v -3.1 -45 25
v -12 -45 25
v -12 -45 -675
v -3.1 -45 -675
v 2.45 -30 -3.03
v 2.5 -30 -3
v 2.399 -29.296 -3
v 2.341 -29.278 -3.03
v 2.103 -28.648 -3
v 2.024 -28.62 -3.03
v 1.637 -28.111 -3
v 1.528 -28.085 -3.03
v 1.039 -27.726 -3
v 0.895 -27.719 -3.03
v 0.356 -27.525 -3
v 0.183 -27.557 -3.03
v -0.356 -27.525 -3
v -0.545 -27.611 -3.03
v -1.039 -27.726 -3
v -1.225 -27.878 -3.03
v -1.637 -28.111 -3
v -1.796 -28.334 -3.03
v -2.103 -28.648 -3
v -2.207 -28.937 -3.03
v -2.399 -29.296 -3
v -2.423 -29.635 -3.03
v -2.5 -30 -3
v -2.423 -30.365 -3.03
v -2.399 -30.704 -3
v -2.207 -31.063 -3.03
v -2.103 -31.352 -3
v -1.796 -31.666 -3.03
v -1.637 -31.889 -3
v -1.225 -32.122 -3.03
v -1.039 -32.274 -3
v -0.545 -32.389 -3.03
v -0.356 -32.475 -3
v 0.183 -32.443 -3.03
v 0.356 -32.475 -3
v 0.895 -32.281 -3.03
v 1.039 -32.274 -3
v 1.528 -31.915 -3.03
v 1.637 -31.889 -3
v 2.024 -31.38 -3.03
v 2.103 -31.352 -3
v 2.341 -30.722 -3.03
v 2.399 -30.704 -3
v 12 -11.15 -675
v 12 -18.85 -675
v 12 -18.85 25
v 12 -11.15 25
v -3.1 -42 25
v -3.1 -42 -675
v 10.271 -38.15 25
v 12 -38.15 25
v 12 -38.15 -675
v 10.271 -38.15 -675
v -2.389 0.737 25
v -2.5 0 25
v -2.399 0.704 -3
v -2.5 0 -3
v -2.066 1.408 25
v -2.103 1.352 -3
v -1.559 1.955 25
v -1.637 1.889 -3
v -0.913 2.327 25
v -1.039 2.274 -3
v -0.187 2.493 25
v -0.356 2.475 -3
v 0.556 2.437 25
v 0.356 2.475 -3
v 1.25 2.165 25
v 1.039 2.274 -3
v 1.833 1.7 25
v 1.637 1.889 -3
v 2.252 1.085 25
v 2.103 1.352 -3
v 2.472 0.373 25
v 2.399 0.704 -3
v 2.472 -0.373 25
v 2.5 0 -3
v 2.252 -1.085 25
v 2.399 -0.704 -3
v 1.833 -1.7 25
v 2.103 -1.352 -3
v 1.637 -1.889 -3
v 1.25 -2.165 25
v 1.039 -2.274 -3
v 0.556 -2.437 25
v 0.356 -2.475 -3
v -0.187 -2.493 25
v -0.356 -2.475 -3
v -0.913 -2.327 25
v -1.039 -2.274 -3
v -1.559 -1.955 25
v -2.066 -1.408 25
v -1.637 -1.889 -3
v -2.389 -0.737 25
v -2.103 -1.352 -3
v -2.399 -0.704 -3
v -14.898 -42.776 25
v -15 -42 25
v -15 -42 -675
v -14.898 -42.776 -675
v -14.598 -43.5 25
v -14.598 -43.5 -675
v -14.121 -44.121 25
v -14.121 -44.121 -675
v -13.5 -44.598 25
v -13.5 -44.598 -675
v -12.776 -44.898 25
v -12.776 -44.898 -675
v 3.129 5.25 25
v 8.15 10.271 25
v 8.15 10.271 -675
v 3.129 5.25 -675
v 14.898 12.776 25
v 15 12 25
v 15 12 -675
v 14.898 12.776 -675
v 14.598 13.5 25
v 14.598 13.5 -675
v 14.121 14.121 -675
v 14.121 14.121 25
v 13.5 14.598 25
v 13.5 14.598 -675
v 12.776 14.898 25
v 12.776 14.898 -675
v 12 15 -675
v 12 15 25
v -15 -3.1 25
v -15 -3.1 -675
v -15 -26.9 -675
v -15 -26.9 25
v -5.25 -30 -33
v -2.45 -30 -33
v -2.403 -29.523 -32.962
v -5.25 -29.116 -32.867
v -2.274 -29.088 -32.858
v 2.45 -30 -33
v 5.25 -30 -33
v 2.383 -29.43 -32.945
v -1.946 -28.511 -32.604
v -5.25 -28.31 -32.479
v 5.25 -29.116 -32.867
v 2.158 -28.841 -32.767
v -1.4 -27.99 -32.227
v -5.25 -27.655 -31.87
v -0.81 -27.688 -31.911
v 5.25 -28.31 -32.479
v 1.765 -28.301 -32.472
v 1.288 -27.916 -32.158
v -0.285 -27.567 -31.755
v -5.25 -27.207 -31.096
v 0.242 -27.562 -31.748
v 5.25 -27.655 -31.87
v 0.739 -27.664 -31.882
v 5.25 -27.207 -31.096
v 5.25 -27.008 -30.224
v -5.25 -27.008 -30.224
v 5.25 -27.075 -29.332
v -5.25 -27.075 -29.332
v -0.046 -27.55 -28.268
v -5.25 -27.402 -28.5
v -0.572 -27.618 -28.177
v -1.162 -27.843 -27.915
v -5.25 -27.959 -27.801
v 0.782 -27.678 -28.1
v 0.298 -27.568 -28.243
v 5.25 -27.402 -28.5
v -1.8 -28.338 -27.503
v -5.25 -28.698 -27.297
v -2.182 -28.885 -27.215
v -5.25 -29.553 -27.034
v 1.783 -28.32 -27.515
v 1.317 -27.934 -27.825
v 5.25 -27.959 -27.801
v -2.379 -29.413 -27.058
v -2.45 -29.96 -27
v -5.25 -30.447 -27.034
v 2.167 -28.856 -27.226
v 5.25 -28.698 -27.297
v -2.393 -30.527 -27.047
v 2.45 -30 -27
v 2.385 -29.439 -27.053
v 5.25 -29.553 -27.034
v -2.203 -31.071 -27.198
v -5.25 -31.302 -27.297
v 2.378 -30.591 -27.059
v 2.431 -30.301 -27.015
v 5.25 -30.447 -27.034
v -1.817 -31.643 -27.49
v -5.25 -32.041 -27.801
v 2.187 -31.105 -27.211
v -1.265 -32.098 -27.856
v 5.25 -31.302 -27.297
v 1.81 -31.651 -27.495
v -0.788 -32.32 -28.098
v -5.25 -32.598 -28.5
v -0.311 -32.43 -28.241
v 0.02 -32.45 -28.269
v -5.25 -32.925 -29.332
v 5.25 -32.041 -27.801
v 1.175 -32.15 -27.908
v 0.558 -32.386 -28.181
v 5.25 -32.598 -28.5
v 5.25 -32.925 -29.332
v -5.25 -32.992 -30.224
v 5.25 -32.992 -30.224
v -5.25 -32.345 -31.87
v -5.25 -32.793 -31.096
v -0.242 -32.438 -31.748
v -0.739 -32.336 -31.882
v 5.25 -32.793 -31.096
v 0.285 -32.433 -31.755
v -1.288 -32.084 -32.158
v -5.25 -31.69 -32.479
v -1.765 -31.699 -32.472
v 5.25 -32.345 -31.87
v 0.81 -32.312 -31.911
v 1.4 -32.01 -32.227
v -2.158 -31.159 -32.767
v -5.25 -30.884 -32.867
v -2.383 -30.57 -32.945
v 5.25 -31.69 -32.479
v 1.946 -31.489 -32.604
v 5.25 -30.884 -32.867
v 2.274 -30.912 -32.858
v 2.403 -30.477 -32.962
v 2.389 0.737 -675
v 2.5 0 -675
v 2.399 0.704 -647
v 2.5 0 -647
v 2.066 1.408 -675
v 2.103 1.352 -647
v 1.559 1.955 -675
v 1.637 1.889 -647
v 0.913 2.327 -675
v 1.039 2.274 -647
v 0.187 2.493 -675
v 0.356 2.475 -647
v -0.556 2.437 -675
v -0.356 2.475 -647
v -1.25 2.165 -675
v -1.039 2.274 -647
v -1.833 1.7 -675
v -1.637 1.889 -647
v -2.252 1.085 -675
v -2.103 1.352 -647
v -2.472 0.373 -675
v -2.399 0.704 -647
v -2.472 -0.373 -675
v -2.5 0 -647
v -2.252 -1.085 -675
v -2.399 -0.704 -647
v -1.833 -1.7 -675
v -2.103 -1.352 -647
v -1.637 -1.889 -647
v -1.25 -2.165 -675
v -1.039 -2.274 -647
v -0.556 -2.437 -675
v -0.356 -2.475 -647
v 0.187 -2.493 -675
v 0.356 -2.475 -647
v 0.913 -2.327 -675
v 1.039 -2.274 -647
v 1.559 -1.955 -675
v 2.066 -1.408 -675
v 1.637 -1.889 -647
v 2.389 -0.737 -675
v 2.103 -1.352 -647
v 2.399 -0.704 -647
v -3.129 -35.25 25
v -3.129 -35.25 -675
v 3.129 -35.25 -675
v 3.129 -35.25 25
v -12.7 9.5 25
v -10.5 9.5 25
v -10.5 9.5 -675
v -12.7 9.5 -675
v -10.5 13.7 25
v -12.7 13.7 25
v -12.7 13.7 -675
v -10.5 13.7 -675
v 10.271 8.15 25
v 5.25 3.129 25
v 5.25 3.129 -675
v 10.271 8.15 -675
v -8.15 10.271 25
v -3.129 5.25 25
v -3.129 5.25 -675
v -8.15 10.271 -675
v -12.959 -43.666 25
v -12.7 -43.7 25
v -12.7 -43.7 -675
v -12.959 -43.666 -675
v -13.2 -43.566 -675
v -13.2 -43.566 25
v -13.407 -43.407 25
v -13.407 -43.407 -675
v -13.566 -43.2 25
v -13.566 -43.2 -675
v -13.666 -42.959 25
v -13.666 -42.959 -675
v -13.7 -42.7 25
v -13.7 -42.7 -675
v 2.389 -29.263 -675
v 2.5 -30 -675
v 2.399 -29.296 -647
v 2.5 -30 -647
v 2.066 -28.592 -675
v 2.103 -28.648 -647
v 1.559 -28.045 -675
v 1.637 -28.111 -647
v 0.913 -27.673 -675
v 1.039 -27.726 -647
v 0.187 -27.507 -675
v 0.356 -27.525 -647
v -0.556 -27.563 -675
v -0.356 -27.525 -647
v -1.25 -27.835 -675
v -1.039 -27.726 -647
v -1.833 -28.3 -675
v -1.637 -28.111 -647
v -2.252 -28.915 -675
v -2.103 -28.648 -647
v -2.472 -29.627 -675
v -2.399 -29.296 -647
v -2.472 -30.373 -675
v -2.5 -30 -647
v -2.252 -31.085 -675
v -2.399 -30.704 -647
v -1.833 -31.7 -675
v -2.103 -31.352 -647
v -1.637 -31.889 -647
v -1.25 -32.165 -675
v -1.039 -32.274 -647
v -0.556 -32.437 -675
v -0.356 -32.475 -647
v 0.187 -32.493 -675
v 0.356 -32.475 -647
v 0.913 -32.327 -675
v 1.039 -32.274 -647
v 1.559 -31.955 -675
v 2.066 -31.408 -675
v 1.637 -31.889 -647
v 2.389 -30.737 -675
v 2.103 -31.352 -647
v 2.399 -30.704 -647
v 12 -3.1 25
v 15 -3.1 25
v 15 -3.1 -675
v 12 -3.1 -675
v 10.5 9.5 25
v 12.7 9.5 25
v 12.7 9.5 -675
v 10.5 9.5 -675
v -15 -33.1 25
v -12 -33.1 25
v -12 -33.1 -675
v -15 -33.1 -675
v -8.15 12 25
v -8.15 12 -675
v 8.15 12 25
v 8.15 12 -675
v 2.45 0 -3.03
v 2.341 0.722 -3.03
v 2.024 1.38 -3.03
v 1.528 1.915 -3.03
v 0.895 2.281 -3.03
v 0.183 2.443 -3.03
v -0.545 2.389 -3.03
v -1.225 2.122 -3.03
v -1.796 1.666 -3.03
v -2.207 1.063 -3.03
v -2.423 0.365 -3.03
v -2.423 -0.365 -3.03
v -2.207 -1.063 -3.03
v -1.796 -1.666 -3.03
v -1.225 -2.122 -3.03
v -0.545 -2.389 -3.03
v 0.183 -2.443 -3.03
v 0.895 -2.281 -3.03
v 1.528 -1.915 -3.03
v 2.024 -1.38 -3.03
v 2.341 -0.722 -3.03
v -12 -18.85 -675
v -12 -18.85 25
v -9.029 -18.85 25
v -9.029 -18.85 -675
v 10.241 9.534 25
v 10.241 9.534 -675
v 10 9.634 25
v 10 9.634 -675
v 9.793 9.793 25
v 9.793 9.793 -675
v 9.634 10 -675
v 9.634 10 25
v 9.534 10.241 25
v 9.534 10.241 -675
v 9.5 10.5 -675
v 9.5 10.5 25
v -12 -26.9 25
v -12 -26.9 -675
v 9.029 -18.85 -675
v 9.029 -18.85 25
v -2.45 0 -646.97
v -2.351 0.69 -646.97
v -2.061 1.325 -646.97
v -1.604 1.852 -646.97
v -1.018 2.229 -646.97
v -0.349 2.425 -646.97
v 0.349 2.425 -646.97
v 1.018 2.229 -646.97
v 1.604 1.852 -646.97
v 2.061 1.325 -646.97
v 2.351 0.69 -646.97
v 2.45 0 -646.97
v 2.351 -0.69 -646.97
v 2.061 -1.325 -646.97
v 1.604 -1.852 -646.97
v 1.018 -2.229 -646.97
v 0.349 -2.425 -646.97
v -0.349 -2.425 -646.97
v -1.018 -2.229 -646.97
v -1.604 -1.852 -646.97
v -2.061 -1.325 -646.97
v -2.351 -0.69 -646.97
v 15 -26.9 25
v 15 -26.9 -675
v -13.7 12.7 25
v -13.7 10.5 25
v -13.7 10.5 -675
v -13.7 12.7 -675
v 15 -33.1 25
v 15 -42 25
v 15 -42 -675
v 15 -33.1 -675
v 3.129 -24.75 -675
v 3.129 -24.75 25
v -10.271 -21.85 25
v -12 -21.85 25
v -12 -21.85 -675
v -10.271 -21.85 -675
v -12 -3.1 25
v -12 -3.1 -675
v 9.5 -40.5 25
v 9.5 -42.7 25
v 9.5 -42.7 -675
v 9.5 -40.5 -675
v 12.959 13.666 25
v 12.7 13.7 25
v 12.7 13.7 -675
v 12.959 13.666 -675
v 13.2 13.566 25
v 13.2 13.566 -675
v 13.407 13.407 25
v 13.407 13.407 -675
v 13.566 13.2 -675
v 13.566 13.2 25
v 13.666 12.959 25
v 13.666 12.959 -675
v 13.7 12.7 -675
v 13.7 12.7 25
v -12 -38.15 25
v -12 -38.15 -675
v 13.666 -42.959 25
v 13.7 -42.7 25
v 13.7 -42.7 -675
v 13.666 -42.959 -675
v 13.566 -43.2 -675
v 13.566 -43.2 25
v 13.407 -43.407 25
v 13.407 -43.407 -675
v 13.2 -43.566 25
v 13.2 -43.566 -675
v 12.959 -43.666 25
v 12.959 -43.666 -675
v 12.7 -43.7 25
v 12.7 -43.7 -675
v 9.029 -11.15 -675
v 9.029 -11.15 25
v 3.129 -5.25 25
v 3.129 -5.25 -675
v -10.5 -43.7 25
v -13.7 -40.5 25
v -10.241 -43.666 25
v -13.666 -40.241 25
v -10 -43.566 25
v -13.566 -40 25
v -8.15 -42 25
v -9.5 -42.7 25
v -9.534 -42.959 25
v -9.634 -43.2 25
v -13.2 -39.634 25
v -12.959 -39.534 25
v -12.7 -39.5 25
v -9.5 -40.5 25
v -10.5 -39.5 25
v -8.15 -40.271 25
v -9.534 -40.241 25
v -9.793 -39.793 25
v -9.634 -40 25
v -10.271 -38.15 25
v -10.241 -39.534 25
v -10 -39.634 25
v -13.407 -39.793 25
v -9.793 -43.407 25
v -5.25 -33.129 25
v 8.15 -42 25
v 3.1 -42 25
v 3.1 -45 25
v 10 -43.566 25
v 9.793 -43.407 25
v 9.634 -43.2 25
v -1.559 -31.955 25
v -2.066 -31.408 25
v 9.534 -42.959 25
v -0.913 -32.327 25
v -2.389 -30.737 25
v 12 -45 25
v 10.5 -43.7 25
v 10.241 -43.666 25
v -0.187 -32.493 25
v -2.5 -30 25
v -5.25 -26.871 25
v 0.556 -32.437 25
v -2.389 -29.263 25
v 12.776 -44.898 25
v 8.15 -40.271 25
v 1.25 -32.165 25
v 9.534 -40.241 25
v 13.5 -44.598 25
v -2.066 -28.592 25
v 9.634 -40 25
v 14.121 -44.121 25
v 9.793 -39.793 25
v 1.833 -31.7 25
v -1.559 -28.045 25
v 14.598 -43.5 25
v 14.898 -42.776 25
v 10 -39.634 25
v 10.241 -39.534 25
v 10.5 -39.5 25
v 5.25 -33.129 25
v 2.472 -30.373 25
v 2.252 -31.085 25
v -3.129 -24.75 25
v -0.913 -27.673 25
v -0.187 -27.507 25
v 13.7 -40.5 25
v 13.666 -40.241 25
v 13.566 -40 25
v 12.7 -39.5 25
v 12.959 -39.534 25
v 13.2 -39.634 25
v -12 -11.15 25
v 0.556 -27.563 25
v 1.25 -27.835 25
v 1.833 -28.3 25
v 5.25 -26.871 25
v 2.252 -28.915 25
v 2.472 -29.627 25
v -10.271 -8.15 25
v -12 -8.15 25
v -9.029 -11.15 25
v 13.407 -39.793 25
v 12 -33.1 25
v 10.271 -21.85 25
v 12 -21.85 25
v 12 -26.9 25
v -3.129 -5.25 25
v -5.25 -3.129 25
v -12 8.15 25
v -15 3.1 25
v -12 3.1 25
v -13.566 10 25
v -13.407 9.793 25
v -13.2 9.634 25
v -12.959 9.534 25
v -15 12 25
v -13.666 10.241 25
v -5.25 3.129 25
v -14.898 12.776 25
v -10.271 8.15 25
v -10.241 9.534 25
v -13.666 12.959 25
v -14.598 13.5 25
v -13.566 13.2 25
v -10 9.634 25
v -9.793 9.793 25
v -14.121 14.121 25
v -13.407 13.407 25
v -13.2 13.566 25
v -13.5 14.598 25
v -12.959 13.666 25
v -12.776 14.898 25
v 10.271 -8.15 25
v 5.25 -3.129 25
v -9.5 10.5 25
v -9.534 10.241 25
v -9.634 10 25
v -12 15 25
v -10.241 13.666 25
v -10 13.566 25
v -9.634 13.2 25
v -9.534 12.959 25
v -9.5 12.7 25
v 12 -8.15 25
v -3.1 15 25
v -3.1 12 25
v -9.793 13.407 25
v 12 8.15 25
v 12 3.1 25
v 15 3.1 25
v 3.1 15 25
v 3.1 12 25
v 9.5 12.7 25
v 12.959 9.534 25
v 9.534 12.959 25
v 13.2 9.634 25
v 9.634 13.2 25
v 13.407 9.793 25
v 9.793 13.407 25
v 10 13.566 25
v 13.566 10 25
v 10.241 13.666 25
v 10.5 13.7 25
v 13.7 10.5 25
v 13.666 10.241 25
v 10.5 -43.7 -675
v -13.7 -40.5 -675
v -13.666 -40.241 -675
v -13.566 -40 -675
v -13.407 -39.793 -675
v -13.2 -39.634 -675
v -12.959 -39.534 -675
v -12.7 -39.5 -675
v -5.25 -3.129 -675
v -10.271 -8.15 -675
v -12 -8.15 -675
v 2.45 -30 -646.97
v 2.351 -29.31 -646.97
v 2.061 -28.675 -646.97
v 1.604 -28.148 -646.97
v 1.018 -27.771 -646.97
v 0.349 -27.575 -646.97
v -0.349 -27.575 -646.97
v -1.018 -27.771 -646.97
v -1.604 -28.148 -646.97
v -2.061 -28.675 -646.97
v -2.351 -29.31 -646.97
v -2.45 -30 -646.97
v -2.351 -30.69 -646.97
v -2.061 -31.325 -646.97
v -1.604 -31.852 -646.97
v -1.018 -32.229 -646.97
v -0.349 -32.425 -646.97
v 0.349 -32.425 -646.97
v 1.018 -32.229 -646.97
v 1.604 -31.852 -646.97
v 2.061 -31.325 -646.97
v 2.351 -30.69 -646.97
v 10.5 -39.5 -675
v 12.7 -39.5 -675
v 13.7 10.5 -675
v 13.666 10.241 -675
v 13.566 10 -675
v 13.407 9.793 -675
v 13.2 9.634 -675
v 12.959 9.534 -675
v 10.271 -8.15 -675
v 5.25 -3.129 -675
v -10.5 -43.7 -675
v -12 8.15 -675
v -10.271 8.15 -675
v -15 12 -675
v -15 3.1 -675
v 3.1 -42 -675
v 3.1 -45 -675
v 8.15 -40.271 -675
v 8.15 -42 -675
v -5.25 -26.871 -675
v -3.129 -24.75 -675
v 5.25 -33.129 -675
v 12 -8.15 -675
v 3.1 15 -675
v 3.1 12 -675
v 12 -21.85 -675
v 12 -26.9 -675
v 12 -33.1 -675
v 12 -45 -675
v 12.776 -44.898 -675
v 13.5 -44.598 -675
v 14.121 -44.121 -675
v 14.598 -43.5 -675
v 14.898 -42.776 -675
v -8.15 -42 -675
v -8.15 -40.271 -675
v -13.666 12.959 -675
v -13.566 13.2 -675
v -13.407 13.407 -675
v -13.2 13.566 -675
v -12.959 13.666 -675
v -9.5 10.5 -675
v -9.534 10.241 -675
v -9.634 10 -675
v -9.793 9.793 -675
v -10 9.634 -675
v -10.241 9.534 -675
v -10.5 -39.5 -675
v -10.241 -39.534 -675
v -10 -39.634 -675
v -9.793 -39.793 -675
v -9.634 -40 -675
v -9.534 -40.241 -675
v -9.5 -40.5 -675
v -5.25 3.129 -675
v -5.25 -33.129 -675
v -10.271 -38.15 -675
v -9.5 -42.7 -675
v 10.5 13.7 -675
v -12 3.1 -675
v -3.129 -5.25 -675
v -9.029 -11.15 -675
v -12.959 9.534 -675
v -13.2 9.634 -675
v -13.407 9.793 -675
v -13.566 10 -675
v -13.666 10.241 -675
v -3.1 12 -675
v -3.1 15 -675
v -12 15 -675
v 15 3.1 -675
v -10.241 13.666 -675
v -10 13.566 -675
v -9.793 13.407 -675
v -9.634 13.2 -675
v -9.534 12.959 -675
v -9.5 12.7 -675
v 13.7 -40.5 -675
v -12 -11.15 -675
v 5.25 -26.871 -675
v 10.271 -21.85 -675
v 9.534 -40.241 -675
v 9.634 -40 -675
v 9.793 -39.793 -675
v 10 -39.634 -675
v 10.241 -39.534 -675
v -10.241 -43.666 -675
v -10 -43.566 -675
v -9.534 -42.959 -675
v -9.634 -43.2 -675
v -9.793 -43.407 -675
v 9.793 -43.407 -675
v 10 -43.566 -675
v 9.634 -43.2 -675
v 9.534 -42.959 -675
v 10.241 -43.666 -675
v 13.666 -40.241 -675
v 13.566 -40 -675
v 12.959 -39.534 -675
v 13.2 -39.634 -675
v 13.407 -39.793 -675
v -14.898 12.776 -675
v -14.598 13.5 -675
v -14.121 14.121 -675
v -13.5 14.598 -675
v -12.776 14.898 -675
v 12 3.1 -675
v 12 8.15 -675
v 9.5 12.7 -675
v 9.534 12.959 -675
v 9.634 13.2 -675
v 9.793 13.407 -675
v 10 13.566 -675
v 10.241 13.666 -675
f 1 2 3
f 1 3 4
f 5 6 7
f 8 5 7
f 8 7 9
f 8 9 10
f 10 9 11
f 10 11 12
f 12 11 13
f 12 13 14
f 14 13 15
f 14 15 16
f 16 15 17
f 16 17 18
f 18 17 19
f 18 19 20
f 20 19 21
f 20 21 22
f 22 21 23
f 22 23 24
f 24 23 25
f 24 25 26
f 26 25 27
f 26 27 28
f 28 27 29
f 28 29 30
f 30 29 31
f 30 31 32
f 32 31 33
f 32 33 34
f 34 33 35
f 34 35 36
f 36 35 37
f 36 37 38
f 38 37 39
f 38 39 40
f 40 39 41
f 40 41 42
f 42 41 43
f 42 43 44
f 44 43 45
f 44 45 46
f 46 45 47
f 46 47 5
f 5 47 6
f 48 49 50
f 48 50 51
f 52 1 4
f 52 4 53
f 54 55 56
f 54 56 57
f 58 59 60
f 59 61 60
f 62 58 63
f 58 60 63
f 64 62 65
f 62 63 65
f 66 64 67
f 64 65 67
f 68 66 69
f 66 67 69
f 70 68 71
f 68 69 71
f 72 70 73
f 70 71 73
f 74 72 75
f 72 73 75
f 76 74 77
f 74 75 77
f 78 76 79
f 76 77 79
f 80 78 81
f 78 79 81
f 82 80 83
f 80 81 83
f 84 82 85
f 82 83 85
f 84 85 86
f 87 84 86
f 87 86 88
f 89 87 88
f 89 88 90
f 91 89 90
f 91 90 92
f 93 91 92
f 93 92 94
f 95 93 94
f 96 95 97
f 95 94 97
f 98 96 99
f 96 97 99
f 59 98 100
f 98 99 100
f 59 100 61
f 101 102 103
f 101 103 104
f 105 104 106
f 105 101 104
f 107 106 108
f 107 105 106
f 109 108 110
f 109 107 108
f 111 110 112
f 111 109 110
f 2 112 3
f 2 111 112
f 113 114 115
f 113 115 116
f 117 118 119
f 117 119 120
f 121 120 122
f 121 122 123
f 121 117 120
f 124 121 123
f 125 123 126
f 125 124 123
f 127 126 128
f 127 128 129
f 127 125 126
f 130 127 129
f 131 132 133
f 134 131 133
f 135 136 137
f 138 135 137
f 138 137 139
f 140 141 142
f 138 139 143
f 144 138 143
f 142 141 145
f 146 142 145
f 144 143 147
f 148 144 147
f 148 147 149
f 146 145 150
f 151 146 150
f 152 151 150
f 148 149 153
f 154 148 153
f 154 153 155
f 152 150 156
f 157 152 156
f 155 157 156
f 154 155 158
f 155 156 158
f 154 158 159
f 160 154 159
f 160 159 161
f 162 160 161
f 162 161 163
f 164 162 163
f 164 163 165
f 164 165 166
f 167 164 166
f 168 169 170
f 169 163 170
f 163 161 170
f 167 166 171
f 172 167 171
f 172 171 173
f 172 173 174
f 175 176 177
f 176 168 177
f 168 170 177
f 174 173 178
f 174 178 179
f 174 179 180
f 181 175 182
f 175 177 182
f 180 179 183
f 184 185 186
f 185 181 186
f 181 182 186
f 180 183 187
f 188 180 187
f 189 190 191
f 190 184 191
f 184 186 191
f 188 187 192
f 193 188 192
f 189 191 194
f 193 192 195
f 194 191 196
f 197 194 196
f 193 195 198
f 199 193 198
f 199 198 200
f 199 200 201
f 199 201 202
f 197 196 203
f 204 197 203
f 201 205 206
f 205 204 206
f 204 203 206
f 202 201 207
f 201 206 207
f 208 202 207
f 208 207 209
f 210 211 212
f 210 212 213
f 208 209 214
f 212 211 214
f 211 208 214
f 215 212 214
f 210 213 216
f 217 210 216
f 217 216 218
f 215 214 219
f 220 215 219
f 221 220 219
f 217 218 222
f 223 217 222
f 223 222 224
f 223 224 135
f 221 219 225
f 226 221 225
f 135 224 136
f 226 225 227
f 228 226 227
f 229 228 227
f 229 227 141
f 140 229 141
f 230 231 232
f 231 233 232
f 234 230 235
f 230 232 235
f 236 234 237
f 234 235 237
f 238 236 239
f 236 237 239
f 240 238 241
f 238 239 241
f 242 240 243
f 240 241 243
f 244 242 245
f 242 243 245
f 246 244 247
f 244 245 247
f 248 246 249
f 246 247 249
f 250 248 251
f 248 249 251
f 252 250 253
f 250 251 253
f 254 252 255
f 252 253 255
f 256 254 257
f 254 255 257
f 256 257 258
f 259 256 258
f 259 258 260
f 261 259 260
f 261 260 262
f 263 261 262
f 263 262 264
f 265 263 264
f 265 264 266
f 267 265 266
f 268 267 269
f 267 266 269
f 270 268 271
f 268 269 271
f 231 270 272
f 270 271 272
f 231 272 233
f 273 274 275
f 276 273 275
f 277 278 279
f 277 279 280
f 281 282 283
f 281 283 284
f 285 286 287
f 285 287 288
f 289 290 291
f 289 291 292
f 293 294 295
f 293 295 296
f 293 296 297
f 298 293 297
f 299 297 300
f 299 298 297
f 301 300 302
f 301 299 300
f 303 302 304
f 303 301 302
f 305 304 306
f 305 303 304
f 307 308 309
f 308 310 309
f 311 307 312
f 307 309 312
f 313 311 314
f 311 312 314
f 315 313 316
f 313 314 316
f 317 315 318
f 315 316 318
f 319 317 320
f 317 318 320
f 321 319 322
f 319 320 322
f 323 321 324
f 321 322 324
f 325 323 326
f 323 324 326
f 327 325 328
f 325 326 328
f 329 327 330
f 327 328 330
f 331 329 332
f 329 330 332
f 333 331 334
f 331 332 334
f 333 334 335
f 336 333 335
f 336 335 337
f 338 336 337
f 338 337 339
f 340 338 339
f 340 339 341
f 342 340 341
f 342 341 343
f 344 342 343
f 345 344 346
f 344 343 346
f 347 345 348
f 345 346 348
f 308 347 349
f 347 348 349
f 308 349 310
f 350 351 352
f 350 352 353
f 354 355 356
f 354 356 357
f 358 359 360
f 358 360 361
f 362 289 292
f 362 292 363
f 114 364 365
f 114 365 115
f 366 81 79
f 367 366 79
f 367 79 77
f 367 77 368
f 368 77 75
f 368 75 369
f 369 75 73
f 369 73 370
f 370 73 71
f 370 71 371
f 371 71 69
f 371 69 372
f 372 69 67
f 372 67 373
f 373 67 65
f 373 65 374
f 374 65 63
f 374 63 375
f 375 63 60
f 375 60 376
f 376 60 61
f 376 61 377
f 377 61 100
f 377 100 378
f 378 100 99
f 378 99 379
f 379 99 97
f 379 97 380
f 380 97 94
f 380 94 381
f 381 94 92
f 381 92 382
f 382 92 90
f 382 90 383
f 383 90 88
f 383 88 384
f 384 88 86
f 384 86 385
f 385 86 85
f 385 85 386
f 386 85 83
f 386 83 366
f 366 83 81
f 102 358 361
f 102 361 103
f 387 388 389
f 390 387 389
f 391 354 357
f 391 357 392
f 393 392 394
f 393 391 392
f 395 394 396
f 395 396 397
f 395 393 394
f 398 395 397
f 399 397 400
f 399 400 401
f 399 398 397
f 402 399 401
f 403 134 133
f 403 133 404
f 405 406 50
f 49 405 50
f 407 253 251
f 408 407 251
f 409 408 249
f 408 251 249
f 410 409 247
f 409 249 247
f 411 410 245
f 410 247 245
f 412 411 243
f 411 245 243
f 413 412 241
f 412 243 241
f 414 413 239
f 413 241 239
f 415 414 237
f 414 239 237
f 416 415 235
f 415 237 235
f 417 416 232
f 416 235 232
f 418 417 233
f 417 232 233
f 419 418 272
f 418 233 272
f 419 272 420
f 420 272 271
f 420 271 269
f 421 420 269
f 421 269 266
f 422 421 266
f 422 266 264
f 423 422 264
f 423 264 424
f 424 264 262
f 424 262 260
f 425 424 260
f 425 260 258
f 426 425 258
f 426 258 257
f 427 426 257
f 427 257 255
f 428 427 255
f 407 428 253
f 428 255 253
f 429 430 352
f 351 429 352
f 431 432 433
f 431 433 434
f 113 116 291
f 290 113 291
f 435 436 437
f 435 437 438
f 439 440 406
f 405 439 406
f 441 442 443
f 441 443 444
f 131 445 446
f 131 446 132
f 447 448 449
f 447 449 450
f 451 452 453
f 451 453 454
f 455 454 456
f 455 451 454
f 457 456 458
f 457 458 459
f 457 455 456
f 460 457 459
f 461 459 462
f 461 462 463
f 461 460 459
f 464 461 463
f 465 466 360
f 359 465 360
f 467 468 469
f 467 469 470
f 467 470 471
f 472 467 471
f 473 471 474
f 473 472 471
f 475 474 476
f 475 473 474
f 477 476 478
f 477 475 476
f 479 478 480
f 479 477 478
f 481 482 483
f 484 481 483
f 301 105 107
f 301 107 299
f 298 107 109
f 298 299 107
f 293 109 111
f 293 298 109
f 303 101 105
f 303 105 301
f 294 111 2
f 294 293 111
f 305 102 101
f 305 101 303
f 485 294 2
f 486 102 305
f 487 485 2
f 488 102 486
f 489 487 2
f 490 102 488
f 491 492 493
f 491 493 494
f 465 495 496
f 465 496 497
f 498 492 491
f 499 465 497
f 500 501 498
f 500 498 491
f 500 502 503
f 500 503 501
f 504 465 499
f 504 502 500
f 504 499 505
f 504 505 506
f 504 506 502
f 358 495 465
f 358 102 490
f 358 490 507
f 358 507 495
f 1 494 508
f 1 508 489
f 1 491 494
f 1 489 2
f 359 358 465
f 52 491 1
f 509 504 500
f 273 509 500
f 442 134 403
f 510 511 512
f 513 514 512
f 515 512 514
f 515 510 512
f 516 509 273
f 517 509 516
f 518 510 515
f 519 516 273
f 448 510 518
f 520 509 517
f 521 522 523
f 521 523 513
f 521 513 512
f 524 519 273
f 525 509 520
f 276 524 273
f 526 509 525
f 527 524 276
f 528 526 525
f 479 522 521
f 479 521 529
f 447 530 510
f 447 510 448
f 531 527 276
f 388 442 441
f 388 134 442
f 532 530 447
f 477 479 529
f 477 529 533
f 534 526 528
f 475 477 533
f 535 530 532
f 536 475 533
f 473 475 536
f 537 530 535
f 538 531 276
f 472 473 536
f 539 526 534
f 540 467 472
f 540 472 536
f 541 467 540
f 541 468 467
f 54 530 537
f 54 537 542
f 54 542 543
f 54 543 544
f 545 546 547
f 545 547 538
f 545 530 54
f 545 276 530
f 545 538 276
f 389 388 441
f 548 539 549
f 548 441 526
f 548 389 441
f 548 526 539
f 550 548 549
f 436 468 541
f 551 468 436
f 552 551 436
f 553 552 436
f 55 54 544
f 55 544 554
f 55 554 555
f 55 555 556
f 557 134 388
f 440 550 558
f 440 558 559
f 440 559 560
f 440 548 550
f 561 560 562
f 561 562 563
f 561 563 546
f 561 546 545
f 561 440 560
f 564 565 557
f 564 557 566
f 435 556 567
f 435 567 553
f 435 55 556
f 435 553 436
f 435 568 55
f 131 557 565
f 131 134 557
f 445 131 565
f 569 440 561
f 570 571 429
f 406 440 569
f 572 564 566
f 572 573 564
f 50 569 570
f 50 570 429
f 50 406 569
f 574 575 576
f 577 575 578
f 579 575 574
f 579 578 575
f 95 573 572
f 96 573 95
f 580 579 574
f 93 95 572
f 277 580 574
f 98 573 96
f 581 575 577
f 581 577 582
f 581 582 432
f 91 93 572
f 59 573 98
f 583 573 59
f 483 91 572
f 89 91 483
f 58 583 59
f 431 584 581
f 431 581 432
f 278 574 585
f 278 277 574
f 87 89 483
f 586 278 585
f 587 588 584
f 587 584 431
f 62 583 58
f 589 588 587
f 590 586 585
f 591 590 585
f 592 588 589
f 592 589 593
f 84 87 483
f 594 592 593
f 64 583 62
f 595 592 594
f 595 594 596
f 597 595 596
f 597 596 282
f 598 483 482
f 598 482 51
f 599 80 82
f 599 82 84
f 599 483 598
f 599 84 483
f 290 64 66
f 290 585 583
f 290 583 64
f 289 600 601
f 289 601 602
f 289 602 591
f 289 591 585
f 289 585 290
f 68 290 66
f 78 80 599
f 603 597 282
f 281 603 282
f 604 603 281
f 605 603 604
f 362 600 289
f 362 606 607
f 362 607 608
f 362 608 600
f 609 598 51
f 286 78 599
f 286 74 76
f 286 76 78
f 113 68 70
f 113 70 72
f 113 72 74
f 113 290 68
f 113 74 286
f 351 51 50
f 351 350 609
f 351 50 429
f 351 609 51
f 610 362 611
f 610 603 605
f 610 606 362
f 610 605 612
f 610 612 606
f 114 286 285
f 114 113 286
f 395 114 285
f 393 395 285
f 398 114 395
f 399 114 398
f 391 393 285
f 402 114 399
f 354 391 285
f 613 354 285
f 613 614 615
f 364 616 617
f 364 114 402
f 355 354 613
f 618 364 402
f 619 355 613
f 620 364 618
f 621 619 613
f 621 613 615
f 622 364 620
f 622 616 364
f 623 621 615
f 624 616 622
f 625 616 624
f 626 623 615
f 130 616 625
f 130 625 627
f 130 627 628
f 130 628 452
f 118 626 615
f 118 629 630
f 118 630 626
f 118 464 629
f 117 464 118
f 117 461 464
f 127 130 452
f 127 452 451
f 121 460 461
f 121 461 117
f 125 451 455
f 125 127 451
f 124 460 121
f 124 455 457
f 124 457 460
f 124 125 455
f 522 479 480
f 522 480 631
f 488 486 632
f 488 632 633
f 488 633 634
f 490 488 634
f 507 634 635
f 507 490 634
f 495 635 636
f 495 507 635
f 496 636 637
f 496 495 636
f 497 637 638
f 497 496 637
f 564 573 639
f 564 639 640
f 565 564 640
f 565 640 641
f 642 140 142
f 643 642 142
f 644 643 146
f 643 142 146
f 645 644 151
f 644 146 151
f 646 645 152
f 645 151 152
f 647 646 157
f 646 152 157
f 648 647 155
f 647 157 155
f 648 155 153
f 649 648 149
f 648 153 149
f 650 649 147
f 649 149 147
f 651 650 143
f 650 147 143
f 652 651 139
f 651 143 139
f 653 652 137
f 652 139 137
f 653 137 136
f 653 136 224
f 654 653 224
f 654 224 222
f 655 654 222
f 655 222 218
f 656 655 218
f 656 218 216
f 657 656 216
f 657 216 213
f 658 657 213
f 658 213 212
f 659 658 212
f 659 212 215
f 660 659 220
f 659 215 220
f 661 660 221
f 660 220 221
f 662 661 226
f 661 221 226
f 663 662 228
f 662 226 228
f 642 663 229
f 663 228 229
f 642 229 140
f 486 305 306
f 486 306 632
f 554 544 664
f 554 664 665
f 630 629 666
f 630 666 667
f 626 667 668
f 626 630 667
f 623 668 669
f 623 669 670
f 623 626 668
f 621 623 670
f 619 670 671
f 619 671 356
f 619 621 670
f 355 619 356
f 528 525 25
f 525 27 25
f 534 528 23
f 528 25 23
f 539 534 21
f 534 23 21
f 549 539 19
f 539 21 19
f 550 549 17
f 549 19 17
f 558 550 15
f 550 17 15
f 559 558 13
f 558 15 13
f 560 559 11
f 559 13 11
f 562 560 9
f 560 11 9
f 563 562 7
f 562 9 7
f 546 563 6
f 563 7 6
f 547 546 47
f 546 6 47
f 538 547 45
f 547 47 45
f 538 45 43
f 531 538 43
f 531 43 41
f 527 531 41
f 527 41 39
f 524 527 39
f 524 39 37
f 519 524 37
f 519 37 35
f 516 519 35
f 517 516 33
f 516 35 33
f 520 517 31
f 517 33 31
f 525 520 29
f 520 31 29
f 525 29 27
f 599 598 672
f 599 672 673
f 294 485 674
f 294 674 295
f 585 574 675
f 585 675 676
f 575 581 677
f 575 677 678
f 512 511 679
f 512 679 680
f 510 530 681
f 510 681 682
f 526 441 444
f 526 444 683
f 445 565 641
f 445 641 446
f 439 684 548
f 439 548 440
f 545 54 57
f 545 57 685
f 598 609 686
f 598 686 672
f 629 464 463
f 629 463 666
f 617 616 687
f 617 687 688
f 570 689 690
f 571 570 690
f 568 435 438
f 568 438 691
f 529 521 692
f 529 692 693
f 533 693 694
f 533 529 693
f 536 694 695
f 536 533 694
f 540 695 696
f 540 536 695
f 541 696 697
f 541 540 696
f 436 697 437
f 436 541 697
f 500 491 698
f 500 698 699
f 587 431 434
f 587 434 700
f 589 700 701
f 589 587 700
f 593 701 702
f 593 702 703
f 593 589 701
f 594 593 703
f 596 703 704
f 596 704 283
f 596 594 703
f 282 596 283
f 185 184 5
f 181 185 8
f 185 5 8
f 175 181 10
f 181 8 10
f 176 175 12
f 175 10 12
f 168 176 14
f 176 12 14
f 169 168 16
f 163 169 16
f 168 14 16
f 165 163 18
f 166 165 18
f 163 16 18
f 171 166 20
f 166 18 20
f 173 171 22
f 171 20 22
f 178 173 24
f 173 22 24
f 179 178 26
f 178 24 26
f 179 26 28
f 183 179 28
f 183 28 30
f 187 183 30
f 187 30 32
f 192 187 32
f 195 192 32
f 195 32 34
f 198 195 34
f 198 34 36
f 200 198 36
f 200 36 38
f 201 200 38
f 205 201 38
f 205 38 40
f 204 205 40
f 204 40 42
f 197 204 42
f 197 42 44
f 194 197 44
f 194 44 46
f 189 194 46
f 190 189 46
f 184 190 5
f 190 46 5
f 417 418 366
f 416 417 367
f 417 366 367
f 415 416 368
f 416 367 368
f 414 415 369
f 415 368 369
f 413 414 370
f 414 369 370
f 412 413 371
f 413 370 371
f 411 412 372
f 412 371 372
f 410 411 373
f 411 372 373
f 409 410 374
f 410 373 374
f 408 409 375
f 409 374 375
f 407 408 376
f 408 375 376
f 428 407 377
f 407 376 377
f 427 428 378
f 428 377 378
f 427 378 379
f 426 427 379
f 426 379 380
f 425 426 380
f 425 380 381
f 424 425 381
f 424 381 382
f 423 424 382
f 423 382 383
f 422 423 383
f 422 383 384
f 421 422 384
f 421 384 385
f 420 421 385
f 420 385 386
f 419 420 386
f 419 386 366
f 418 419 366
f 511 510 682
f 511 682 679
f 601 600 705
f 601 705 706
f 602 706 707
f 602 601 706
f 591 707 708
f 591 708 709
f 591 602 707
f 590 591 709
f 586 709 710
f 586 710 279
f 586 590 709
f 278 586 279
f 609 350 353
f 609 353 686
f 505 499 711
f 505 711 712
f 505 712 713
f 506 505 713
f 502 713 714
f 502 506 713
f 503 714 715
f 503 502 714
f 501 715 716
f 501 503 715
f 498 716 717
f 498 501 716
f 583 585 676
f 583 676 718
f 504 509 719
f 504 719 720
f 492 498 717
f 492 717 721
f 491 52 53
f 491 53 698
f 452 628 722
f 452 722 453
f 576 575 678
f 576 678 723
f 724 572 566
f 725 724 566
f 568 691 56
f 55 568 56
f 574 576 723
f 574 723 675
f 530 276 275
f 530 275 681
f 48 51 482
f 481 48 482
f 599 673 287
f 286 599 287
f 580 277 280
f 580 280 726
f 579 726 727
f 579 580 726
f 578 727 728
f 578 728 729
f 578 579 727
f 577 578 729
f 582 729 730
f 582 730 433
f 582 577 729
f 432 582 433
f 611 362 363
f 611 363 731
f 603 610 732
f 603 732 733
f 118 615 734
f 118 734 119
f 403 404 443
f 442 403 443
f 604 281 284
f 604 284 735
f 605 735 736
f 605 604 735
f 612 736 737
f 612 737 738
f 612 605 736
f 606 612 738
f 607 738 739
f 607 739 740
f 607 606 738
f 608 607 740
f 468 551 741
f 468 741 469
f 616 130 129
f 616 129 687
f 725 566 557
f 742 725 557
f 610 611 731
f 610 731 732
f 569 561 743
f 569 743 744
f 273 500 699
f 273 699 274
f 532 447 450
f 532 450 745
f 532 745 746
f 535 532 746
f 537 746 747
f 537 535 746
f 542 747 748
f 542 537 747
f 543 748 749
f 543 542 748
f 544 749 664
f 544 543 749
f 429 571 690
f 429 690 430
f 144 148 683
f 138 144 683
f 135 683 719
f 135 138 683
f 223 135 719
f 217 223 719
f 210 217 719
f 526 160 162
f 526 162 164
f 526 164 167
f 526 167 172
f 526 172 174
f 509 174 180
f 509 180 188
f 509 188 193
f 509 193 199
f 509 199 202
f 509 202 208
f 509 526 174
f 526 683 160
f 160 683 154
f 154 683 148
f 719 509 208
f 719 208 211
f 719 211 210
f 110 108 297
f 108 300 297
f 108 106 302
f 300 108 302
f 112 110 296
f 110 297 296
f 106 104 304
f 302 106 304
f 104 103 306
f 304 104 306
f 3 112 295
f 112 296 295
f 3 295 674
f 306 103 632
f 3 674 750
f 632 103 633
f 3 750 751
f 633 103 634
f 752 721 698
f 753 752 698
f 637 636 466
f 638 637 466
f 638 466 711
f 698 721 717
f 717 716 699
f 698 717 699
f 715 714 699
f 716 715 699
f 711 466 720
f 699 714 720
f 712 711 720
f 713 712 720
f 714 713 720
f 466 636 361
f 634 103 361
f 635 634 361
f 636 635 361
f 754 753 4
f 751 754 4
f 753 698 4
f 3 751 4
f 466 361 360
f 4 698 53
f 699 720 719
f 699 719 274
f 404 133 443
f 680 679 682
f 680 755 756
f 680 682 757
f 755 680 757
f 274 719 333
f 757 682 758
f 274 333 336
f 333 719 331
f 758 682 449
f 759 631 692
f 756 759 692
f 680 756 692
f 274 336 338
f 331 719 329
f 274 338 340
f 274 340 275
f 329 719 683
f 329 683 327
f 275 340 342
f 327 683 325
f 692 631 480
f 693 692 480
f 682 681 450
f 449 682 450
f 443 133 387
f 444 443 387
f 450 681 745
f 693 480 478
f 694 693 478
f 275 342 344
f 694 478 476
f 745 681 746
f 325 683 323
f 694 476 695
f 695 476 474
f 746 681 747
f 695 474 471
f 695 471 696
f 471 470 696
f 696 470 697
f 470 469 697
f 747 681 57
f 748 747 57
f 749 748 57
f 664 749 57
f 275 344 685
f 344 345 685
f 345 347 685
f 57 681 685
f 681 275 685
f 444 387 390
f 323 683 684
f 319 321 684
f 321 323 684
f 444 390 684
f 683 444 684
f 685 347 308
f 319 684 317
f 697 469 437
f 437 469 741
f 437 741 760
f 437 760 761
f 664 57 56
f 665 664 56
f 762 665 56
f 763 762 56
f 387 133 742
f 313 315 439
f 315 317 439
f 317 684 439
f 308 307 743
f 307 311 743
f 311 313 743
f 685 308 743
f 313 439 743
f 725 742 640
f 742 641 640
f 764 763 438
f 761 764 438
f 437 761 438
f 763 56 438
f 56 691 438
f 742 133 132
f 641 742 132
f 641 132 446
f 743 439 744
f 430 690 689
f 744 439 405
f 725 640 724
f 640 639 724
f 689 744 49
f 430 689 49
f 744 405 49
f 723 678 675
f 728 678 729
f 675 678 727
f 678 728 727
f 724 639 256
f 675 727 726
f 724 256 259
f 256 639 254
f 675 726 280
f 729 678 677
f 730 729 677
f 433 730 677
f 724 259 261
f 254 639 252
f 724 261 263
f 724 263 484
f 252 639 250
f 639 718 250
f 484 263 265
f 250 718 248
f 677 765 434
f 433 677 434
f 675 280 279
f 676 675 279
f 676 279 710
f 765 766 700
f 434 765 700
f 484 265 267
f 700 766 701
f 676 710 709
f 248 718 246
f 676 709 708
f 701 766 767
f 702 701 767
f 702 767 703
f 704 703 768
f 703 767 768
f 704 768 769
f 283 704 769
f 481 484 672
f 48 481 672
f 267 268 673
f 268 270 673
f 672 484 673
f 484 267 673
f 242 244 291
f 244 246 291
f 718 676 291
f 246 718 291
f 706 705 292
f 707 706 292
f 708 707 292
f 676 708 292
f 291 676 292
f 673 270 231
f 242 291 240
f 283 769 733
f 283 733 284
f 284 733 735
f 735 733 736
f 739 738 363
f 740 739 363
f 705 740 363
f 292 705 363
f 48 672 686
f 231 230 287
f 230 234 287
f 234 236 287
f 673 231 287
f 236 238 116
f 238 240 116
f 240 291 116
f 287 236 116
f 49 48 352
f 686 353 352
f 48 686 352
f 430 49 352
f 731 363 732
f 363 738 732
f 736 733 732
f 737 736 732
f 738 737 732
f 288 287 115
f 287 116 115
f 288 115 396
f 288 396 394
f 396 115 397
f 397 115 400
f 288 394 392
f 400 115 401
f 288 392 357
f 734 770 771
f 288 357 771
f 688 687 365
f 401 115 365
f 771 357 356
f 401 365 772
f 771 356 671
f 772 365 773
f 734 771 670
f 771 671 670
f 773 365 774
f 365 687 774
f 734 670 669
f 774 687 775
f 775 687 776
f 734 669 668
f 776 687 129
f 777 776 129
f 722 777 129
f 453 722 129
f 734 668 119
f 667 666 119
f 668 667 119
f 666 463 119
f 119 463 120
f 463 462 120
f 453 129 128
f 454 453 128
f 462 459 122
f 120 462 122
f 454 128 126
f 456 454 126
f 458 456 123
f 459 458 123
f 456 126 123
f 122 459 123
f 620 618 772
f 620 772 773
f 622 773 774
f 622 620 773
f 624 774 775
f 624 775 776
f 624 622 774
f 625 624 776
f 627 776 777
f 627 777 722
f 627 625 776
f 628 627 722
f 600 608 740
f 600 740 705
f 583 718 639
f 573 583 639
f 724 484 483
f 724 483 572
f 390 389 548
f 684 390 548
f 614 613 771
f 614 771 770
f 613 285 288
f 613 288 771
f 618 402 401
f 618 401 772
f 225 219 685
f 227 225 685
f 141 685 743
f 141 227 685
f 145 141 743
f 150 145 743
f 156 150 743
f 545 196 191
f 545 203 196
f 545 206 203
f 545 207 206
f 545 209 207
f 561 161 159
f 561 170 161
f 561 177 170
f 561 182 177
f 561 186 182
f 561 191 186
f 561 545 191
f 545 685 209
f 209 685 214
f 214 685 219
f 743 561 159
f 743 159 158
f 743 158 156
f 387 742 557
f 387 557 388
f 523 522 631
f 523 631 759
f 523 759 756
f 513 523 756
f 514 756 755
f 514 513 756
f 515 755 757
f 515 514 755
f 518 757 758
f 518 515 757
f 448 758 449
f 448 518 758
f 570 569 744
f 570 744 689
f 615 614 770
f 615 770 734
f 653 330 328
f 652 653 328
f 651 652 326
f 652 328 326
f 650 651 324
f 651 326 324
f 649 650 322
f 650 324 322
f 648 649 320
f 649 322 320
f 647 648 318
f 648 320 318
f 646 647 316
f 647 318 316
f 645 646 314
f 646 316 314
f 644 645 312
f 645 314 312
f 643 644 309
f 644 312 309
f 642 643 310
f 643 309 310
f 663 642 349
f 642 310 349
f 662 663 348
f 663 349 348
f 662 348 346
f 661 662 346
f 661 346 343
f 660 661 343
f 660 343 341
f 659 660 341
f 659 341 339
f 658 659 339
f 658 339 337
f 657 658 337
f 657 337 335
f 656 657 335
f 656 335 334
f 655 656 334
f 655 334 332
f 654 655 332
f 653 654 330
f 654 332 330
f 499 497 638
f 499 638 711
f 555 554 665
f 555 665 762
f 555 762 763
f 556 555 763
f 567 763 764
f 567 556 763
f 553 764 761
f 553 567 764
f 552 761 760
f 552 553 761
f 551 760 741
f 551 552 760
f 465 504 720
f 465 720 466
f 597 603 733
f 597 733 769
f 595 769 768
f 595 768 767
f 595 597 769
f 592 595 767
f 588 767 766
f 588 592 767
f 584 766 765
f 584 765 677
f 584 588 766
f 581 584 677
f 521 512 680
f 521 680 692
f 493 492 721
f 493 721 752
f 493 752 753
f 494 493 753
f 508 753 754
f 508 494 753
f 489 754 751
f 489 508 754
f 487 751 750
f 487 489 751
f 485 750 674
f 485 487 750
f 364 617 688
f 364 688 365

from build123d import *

# Parameters (mm, degrees)
SKETCH1_R                 = 2.45
BOSS_EXTRUDE1_DEPTH       = 700
SKETCH2_R                 = 3
CUT_EXTRUDE1_DEPTH        = 678.163200418
M6X1_0_TAPPED_HOLE1_D     = 5
M6X1_0_TAPPED_HOLE1_DEPTH = 28
M6X1_0_TAPPED_HOLE1_TIP   = 1.502151548
M6X1_0_TAPPED_HOLE2_D     = 5
M6X1_0_TAPPED_HOLE2_DEPTH = 28
M6X1_0_TAPPED_HOLE2_TIP   = 1.502151548


with BuildPart() as part:
    # Sketch1 → Boss-Extrude1 (new body)
    with BuildSketch(Plane.XY.offset(25)):
        with BuildLine():
            Line((10.271320344, -21.85), (12, -21.85))
            Line((12, -21.85), (12, -26.9))
            Line((12, -26.9), (15, -26.9))
            Line((15, -26.9), (15, -3.1))
            Line((15, -3.1), (12, -3.1))
            Line((12, -3.1), (12, -8.15))
            Line((12, -8.15), (10.271320344, -8.15))
            Line((10.271320344, -8.15), (5.25, -3.128679656))
            Line((5.25, -3.128679656), (5.25, 3.128679656))
            Line((5.25, 3.128679656), (10.271320344, 8.15))
            Line((10.271320344, 8.15), (12, 8.15))
            Line((12, 8.15), (12, 3.1))
            Line((12, 3.1), (15, 3.1))
            Line((15, 3.1), (15, 12))
            ThreePointArc((15, 12), (14.121320344, 14.121320344), (12, 15))
            Line((12, 15), (3.1, 15))
            Line((3.1, 15), (3.1, 12))
            Line((3.1, 12), (8.15, 12))
            Line((8.15, 12), (8.15, 10.271320344))
            Line((8.15, 10.271320344), (3.128679656, 5.25))
            Line((3.128679656, 5.25), (-3.128679656, 5.25))
            Line((-3.128679656, 5.25), (-8.15, 10.271320344))
            Line((-8.15, 10.271320344), (-8.15, 12))
            Line((-8.15, 12), (-3.1, 12))
            Line((-3.1, 12), (-3.1, 15))
            Line((-3.1, 15), (-12, 15))
            ThreePointArc((-12, 15), (-14.121320344, 14.121320344), (-15, 12))
            Line((-15, 12), (-15, 3.1))
            Line((-15, 3.1), (-12, 3.1))
            Line((-12, 3.1), (-12, 8.15))
            Line((-12, 8.15), (-10.271320344, 8.15))
            Line((-10.271320344, 8.15), (-5.25, 3.128679656))
            Line((-5.25, 3.128679656), (-5.25, -3.128679656))
            Line((-5.25, -3.128679656), (-10.271320344, -8.15))
            Line((-10.271320344, -8.15), (-12, -8.15))
            Line((-12, -8.15), (-12, -3.1))
            Line((-12, -3.1), (-15, -3.1))
            Line((-15, -3.1), (-15, -26.9))
            Line((-15, -26.9), (-12, -26.9))
            Line((-12, -26.9), (-12, -21.85))
            Line((-12, -21.85), (-10.271320344, -21.85))
            Line((-10.271320344, -21.85), (-5.25, -26.871320344))
            Line((-5.25, -26.871320344), (-5.25, -33.128679656))
            Line((-5.25, -33.128679656), (-10.271320344, -38.15))
            Line((-10.271320344, -38.15), (-12, -38.15))
            Line((-12, -38.15), (-12, -33.1))
            Line((-12, -33.1), (-15, -33.1))
            Line((-15, -33.1), (-15, -42))
            ThreePointArc((-15, -42), (-14.121320344, -44.121320344), (-12, -45))
            Line((-12, -45), (-3.1, -45))
            Line((-3.1, -45), (-3.1, -42))
            Line((-3.1, -42), (-8.15, -42))
            Line((-8.15, -42), (-8.15, -40.271320344))
            Line((-8.15, -40.271320344), (-3.128679656, -35.25))
            Line((-3.128679656, -35.25), (3.128679656, -35.25))
            Line((3.128679656, -35.25), (8.15, -40.271320344))
            Line((8.15, -40.271320344), (8.15, -42))
            Line((8.15, -42), (3.1, -42))
            Line((3.1, -42), (3.1, -45))
            Line((3.1, -45), (12, -45))
            ThreePointArc((12, -45), (14.121320344, -44.121320344), (15, -42))
            Line((15, -42), (15, -33.1))
            Line((15, -33.1), (12, -33.1))
            Line((12, -33.1), (12, -38.15))
            Line((12, -38.15), (10.271320344, -38.15))
            Line((10.271320344, -38.15), (5.25, -33.128679656))
            Line((5.25, -33.128679656), (5.25, -26.871320344))
            Line((5.25, -26.871320344), (10.271320344, -21.85))
        make_face()
        Circle(SKETCH1_R, mode=Mode.SUBTRACT)
        with Locations((0, -30)):
            Circle(SKETCH1_R, mode=Mode.SUBTRACT)
        with BuildLine():
            Line((-9.500000904, 12.700000174), (-9.500000904, 10.500000174))
            ThreePointArc((-9.500000904, 10.500000174), (-9.792894123, 9.792893393), (-10.500000904, 9.500000174))
            Line((-10.500000904, 9.500000174), (-12.700000904, 9.500000174))
            ThreePointArc((-12.700000904, 9.500000174), (-13.407107685, 9.792893393), (-13.700000904, 10.500000174))
            Line((-13.700000904, 10.500000174), (-13.700000904, 12.700000174))
            ThreePointArc((-13.700000904, 12.700000174), (-13.407107685, 13.407106955), (-12.700000904, 13.700000174))
            Line((-12.700000904, 13.700000174), (-10.500000904, 13.700000174))
            ThreePointArc((-10.500000904, 13.700000174), (-9.792894123, 13.407106955), (-9.500000904, 12.700000174))
        make_face(mode=Mode.SUBTRACT)
        with BuildLine():
            Line((12.700000904, 9.500000174), (10.500000904, 9.500000174))
            ThreePointArc((10.500000904, 9.500000174), (9.792894123, 9.792893393), (9.500000904, 10.500000174))
            Line((9.500000904, 10.500000174), (9.500000904, 12.700000174))
            ThreePointArc((9.500000904, 12.700000174), (9.792894123, 13.407106955), (10.500000904, 13.700000174))
            Line((10.500000904, 13.700000174), (12.700000904, 13.700000174))
            ThreePointArc((12.700000904, 13.700000174), (13.407107685, 13.407106955), (13.700000904, 12.700000174))
            Line((13.700000904, 12.700000174), (13.700000904, 10.500000174))
            ThreePointArc((13.700000904, 10.500000174), (13.407107685, 9.792893393), (12.700000904, 9.500000174))
        make_face(mode=Mode.SUBTRACT)
        with BuildLine():
            Line((-12.700000904, -39.500000174), (-10.500000904, -39.500000174))
            ThreePointArc((-10.500000904, -39.500000174), (-9.792894123, -39.792893393), (-9.500000904, -40.500000174))
            Line((-9.500000904, -40.500000174), (-9.500000904, -42.700000174))
            ThreePointArc((-9.500000904, -42.700000174), (-9.792894123, -43.407106955), (-10.500000904, -43.700000174))
            Line((-10.500000904, -43.700000174), (-12.700000904, -43.700000174))
            ThreePointArc((-12.700000904, -43.700000174), (-13.407107685, -43.407106955), (-13.700000904, -42.700000174))
            Line((-13.700000904, -42.700000174), (-13.700000904, -40.500000174))
            ThreePointArc((-13.700000904, -40.500000174), (-13.407107685, -39.792893393), (-12.700000904, -39.500000174))
        make_face(mode=Mode.SUBTRACT)
        with BuildLine():
            Line((9.500000904, -42.700000174), (9.500000904, -40.500000174))
            ThreePointArc((9.500000904, -40.500000174), (9.792894123, -39.792893393), (10.500000904, -39.500000174))
            Line((10.500000904, -39.500000174), (12.700000904, -39.500000174))
            ThreePointArc((12.700000904, -39.500000174), (13.407107685, -39.792893393), (13.700000904, -40.500000174))
            Line((13.700000904, -40.500000174), (13.700000904, -42.700000174))
            ThreePointArc((13.700000904, -42.700000174), (13.407107685, -43.407106955), (12.700000904, -43.700000174))
            Line((12.700000904, -43.700000174), (10.500000904, -43.700000174))
            ThreePointArc((10.500000904, -43.700000174), (9.792894123, -43.407106955), (9.500000904, -42.700000174))
        make_face(mode=Mode.SUBTRACT)
        Polygon((3.128679656, -24.75), (9.028679656, -18.85), (12, -18.85), (12, -11.15), (9.028679656, -11.15), (3.128679656, -5.25), (-3.128679656, -5.25), (-9.028679656, -11.15), (-12, -11.15), (-12, -18.85), (-9.028679656, -18.85), (-3.128679656, -24.75), align=None, mode=Mode.SUBTRACT)
    extrude(amount=-BOSS_EXTRUDE1_DEPTH)

    # Sketch2 → Cut-Extrude1 (cut, through all)
    with BuildSketch(Plane(origin=(15, 0, 0), x_dir=(0, 0, -1), z_dir=(1, 0, 0))):
        with Locations((30, -30)):
            Circle(SKETCH2_R)
    extrude(amount=-CUT_EXTRUDE1_DEPTH, mode=Mode.SUBTRACT)

    # M6x1.0 Tapped Hole1
    with Locations(Plane.XY.offset(25)):
        with Locations((0, 0), (0, -30)):
            Hole(M6X1_0_TAPPED_HOLE1_D / 2, depth=M6X1_0_TAPPED_HOLE1_DEPTH)
            with Locations((0, 0, -(M6X1_0_TAPPED_HOLE1_DEPTH + M6X1_0_TAPPED_HOLE1_TIP / 2))):  # 118° drill point
                Cone(0, M6X1_0_TAPPED_HOLE1_D / 2, M6X1_0_TAPPED_HOLE1_TIP, mode=Mode.SUBTRACT)

    # M6x1.0 Tapped Hole2
    with Locations(Plane(origin=(0, 0, -675), x_dir=(-1, 0, 0), z_dir=(0, 0, -1))):
        with Locations((0, 0), (0, -30)):
            Hole(M6X1_0_TAPPED_HOLE2_D / 2, depth=M6X1_0_TAPPED_HOLE2_DEPTH)
            with Locations((0, 0, -(M6X1_0_TAPPED_HOLE2_DEPTH + M6X1_0_TAPPED_HOLE2_TIP / 2))):  # 118° drill point
                Cone(0, M6X1_0_TAPPED_HOLE2_D / 2, M6X1_0_TAPPED_HOLE2_TIP, mode=Mode.SUBTRACT)


solid = part.part
